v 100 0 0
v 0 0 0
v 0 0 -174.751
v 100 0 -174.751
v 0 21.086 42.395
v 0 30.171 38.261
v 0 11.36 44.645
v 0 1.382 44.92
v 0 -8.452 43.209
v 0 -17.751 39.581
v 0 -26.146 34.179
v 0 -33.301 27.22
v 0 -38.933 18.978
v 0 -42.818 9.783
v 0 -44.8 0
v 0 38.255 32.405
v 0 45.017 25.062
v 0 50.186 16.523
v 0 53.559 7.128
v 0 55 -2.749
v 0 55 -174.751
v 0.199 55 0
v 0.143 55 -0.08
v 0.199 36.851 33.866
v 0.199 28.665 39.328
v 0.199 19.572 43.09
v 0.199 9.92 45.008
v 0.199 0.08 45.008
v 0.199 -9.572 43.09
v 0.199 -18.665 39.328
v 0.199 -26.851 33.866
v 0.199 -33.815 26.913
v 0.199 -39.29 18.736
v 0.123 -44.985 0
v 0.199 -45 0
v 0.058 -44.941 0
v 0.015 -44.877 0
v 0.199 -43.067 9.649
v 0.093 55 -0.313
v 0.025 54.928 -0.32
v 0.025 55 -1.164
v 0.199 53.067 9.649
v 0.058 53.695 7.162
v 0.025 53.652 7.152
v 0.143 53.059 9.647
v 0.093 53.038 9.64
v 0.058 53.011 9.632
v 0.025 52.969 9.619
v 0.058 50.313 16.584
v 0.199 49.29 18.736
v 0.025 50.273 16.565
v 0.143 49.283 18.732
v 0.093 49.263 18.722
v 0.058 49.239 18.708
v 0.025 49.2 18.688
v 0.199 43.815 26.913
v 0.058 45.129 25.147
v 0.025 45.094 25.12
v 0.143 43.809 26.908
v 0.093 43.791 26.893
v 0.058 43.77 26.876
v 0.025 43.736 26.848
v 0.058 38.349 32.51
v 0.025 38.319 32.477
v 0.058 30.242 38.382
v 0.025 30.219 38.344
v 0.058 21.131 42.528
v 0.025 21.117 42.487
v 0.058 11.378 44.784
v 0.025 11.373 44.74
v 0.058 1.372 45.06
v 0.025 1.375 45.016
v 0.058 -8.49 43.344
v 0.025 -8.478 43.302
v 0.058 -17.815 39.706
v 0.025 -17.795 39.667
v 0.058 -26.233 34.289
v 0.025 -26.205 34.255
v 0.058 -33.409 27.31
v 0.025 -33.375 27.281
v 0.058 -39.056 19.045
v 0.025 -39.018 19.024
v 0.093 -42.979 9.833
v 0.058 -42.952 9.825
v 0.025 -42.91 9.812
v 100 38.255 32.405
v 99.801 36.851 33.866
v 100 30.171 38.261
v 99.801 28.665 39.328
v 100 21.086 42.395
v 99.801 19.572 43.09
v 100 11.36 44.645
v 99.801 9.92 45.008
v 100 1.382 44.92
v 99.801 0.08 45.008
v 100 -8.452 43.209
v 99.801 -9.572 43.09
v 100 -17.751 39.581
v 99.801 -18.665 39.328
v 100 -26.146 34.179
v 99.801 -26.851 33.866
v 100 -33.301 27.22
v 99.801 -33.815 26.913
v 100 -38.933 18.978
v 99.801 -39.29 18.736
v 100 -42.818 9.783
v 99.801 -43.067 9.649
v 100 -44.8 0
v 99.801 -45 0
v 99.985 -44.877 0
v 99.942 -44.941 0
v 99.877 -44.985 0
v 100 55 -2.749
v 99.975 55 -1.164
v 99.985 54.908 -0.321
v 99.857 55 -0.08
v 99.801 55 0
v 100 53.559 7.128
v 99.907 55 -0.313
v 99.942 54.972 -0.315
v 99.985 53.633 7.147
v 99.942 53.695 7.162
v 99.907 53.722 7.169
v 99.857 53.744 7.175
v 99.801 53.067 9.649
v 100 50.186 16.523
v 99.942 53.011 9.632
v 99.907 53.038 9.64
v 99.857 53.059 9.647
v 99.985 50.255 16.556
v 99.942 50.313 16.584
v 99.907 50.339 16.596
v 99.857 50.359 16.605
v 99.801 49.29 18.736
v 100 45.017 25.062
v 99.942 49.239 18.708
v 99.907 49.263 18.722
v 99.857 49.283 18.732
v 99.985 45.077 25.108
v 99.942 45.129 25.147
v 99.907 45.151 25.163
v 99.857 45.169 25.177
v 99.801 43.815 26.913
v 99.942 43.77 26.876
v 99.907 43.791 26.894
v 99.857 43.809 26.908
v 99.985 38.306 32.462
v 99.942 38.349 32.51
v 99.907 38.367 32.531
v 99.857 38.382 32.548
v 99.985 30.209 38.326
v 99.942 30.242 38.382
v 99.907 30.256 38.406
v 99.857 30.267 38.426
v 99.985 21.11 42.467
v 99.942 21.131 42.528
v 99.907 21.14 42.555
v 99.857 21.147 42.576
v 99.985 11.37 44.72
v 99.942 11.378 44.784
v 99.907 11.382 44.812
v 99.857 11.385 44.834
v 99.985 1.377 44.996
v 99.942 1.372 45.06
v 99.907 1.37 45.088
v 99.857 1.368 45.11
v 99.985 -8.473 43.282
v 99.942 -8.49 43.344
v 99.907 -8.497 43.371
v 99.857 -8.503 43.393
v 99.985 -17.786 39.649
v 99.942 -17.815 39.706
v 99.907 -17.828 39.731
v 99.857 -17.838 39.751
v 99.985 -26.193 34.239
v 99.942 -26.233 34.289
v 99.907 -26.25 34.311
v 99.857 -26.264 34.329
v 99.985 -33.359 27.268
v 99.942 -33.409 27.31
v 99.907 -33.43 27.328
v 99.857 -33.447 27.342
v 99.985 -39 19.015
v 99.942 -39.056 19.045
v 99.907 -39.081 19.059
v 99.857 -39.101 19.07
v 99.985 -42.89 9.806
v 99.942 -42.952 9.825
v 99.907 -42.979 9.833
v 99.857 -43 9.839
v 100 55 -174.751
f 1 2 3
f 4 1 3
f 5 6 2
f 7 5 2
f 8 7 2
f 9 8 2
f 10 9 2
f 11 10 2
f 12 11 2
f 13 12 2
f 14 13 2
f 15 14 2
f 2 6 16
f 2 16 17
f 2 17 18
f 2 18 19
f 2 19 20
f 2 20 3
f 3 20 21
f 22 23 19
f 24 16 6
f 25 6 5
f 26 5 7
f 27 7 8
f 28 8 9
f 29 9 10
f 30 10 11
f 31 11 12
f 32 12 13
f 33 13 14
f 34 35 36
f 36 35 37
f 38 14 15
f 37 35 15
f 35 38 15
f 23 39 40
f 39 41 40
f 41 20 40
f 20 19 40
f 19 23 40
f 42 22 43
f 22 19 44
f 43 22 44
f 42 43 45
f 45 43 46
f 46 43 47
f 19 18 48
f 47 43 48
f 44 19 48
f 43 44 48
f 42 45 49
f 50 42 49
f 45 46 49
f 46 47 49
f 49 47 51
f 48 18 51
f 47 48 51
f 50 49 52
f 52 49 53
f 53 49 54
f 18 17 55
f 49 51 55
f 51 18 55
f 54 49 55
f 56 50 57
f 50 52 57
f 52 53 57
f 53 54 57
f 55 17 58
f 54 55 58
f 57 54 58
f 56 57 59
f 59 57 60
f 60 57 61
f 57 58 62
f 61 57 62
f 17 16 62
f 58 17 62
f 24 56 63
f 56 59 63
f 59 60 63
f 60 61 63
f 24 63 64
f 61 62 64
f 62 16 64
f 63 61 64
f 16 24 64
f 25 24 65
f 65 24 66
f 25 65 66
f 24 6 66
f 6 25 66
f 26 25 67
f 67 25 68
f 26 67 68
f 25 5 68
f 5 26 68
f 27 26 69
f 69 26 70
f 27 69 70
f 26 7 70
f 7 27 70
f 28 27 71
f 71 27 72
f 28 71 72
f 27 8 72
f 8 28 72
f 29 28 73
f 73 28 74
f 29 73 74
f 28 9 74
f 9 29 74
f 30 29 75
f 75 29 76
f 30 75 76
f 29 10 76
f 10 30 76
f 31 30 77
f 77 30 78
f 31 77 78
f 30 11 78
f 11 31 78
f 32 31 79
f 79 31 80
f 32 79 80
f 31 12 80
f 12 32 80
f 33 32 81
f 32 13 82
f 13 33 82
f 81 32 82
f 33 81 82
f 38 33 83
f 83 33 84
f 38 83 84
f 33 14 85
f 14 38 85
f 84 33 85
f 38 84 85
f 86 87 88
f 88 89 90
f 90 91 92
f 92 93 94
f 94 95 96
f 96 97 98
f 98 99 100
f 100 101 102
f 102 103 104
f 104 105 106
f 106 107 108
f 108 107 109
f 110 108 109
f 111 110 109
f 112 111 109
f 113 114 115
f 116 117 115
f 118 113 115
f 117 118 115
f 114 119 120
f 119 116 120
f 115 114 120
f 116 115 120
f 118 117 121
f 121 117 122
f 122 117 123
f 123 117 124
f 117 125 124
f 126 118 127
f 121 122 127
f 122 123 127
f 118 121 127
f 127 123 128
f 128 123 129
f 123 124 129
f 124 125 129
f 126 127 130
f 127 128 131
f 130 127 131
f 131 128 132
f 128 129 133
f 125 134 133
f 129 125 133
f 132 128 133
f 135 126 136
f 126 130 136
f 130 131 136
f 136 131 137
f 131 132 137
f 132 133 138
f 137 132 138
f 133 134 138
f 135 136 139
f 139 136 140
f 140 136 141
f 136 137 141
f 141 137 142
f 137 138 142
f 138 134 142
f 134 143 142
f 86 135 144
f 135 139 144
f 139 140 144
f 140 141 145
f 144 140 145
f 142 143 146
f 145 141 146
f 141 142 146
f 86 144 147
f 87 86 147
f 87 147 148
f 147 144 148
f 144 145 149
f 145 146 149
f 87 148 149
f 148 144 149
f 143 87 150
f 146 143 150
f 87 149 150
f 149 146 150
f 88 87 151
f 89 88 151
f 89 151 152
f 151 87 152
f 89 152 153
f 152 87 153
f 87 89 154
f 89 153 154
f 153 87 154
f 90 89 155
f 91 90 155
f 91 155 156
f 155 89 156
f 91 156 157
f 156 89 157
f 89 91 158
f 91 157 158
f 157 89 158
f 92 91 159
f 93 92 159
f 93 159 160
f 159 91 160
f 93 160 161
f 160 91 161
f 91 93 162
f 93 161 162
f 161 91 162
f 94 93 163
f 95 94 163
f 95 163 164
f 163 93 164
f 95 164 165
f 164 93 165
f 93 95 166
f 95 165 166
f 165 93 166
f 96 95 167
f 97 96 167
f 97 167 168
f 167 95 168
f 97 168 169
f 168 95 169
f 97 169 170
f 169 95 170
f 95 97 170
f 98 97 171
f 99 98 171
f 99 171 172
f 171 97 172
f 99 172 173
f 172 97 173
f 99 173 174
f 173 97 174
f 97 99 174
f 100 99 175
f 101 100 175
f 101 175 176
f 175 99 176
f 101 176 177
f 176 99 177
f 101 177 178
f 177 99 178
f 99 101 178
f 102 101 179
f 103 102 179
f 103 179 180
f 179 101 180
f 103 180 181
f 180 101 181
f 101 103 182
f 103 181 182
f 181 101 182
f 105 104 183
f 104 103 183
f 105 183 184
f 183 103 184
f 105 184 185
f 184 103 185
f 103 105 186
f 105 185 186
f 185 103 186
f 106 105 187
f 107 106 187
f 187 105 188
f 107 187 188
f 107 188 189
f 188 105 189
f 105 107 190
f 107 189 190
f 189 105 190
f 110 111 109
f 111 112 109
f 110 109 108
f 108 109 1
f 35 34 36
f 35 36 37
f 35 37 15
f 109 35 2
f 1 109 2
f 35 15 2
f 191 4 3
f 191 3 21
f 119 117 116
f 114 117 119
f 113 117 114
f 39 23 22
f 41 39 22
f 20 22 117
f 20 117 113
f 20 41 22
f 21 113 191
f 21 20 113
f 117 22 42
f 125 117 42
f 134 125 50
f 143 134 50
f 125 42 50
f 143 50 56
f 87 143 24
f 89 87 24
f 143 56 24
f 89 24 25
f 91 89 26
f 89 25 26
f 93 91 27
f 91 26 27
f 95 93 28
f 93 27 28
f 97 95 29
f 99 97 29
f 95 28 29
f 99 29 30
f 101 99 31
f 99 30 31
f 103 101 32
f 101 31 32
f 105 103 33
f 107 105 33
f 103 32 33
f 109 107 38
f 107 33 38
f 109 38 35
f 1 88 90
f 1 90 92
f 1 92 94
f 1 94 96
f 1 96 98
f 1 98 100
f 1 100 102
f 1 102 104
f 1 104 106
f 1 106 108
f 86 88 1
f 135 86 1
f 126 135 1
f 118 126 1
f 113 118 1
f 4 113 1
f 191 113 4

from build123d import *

# Parameters (mm, degrees)
SKETCH2_W           = 174.75062189439555
SKETCH2_H           = 55.00000000000001
BOSS_EXTRUDE1_DEPTH = 100
FILLET1_ANGLE       = 171.711787


with BuildPart() as part:
    # Sketch2 → Boss-Extrude1 (new body)
    with BuildSketch(Plane(origin=(0, 0, 0), x_dir=(0, 0, -1), z_dir=(1, 0, 0))):
        with Locations((87.37531094719778, 27.500000000000004)):
            Rectangle(SKETCH2_W, SKETCH2_H)
        with BuildLine():
            Line((0, 0), (0, 55.00000000000001))
            ThreePointArc((0, 55.00000000000001), (-45.24937810560445, 5.000000000000011), (5.51e-15, -45))
            Line((5.51e-15, -45), (0, 0))
        make_face()
    extrude(amount=BOSS_EXTRUDE1_DEPTH)

    # Fillet1: read off the stored shape, not the designer's step
    # Fillet1 outline → Fillet1 (revolve, cut)
    with BuildSketch(Plane(origin=(0, 5, -5), x_dir=(0, 0.998988212638407, 0.04497278076260073), z_dir=(0, 0.04497278076260073, -0.998988212638407))):
        with BuildLine():
            ThreePointArc((50.249378106, 0.1987375), (50.19116924, 0.058208866), (50.050640606, 0))
            Line((50.050640606, 0), (50.249378106, 0))
            Line((50.249378106, 0), (50.249378106, 0.1987375))
        make_face()
        with BuildLine():
            ThreePointArc((50.050640606, 100), (50.19116924, 99.941791134), (50.249378106, 99.8012625))
            Line((50.249378106, 99.8012625), (50.249378106, 100))
            Line((50.249378106, 100), (50.050640606, 100))
        make_face()
    revolve(axis=Axis((0, 5, -5), (1, 0, 0)), revolution_arc=FILLET1_ANGLE, mode=Mode.SUBTRACT)


solid = part.part
